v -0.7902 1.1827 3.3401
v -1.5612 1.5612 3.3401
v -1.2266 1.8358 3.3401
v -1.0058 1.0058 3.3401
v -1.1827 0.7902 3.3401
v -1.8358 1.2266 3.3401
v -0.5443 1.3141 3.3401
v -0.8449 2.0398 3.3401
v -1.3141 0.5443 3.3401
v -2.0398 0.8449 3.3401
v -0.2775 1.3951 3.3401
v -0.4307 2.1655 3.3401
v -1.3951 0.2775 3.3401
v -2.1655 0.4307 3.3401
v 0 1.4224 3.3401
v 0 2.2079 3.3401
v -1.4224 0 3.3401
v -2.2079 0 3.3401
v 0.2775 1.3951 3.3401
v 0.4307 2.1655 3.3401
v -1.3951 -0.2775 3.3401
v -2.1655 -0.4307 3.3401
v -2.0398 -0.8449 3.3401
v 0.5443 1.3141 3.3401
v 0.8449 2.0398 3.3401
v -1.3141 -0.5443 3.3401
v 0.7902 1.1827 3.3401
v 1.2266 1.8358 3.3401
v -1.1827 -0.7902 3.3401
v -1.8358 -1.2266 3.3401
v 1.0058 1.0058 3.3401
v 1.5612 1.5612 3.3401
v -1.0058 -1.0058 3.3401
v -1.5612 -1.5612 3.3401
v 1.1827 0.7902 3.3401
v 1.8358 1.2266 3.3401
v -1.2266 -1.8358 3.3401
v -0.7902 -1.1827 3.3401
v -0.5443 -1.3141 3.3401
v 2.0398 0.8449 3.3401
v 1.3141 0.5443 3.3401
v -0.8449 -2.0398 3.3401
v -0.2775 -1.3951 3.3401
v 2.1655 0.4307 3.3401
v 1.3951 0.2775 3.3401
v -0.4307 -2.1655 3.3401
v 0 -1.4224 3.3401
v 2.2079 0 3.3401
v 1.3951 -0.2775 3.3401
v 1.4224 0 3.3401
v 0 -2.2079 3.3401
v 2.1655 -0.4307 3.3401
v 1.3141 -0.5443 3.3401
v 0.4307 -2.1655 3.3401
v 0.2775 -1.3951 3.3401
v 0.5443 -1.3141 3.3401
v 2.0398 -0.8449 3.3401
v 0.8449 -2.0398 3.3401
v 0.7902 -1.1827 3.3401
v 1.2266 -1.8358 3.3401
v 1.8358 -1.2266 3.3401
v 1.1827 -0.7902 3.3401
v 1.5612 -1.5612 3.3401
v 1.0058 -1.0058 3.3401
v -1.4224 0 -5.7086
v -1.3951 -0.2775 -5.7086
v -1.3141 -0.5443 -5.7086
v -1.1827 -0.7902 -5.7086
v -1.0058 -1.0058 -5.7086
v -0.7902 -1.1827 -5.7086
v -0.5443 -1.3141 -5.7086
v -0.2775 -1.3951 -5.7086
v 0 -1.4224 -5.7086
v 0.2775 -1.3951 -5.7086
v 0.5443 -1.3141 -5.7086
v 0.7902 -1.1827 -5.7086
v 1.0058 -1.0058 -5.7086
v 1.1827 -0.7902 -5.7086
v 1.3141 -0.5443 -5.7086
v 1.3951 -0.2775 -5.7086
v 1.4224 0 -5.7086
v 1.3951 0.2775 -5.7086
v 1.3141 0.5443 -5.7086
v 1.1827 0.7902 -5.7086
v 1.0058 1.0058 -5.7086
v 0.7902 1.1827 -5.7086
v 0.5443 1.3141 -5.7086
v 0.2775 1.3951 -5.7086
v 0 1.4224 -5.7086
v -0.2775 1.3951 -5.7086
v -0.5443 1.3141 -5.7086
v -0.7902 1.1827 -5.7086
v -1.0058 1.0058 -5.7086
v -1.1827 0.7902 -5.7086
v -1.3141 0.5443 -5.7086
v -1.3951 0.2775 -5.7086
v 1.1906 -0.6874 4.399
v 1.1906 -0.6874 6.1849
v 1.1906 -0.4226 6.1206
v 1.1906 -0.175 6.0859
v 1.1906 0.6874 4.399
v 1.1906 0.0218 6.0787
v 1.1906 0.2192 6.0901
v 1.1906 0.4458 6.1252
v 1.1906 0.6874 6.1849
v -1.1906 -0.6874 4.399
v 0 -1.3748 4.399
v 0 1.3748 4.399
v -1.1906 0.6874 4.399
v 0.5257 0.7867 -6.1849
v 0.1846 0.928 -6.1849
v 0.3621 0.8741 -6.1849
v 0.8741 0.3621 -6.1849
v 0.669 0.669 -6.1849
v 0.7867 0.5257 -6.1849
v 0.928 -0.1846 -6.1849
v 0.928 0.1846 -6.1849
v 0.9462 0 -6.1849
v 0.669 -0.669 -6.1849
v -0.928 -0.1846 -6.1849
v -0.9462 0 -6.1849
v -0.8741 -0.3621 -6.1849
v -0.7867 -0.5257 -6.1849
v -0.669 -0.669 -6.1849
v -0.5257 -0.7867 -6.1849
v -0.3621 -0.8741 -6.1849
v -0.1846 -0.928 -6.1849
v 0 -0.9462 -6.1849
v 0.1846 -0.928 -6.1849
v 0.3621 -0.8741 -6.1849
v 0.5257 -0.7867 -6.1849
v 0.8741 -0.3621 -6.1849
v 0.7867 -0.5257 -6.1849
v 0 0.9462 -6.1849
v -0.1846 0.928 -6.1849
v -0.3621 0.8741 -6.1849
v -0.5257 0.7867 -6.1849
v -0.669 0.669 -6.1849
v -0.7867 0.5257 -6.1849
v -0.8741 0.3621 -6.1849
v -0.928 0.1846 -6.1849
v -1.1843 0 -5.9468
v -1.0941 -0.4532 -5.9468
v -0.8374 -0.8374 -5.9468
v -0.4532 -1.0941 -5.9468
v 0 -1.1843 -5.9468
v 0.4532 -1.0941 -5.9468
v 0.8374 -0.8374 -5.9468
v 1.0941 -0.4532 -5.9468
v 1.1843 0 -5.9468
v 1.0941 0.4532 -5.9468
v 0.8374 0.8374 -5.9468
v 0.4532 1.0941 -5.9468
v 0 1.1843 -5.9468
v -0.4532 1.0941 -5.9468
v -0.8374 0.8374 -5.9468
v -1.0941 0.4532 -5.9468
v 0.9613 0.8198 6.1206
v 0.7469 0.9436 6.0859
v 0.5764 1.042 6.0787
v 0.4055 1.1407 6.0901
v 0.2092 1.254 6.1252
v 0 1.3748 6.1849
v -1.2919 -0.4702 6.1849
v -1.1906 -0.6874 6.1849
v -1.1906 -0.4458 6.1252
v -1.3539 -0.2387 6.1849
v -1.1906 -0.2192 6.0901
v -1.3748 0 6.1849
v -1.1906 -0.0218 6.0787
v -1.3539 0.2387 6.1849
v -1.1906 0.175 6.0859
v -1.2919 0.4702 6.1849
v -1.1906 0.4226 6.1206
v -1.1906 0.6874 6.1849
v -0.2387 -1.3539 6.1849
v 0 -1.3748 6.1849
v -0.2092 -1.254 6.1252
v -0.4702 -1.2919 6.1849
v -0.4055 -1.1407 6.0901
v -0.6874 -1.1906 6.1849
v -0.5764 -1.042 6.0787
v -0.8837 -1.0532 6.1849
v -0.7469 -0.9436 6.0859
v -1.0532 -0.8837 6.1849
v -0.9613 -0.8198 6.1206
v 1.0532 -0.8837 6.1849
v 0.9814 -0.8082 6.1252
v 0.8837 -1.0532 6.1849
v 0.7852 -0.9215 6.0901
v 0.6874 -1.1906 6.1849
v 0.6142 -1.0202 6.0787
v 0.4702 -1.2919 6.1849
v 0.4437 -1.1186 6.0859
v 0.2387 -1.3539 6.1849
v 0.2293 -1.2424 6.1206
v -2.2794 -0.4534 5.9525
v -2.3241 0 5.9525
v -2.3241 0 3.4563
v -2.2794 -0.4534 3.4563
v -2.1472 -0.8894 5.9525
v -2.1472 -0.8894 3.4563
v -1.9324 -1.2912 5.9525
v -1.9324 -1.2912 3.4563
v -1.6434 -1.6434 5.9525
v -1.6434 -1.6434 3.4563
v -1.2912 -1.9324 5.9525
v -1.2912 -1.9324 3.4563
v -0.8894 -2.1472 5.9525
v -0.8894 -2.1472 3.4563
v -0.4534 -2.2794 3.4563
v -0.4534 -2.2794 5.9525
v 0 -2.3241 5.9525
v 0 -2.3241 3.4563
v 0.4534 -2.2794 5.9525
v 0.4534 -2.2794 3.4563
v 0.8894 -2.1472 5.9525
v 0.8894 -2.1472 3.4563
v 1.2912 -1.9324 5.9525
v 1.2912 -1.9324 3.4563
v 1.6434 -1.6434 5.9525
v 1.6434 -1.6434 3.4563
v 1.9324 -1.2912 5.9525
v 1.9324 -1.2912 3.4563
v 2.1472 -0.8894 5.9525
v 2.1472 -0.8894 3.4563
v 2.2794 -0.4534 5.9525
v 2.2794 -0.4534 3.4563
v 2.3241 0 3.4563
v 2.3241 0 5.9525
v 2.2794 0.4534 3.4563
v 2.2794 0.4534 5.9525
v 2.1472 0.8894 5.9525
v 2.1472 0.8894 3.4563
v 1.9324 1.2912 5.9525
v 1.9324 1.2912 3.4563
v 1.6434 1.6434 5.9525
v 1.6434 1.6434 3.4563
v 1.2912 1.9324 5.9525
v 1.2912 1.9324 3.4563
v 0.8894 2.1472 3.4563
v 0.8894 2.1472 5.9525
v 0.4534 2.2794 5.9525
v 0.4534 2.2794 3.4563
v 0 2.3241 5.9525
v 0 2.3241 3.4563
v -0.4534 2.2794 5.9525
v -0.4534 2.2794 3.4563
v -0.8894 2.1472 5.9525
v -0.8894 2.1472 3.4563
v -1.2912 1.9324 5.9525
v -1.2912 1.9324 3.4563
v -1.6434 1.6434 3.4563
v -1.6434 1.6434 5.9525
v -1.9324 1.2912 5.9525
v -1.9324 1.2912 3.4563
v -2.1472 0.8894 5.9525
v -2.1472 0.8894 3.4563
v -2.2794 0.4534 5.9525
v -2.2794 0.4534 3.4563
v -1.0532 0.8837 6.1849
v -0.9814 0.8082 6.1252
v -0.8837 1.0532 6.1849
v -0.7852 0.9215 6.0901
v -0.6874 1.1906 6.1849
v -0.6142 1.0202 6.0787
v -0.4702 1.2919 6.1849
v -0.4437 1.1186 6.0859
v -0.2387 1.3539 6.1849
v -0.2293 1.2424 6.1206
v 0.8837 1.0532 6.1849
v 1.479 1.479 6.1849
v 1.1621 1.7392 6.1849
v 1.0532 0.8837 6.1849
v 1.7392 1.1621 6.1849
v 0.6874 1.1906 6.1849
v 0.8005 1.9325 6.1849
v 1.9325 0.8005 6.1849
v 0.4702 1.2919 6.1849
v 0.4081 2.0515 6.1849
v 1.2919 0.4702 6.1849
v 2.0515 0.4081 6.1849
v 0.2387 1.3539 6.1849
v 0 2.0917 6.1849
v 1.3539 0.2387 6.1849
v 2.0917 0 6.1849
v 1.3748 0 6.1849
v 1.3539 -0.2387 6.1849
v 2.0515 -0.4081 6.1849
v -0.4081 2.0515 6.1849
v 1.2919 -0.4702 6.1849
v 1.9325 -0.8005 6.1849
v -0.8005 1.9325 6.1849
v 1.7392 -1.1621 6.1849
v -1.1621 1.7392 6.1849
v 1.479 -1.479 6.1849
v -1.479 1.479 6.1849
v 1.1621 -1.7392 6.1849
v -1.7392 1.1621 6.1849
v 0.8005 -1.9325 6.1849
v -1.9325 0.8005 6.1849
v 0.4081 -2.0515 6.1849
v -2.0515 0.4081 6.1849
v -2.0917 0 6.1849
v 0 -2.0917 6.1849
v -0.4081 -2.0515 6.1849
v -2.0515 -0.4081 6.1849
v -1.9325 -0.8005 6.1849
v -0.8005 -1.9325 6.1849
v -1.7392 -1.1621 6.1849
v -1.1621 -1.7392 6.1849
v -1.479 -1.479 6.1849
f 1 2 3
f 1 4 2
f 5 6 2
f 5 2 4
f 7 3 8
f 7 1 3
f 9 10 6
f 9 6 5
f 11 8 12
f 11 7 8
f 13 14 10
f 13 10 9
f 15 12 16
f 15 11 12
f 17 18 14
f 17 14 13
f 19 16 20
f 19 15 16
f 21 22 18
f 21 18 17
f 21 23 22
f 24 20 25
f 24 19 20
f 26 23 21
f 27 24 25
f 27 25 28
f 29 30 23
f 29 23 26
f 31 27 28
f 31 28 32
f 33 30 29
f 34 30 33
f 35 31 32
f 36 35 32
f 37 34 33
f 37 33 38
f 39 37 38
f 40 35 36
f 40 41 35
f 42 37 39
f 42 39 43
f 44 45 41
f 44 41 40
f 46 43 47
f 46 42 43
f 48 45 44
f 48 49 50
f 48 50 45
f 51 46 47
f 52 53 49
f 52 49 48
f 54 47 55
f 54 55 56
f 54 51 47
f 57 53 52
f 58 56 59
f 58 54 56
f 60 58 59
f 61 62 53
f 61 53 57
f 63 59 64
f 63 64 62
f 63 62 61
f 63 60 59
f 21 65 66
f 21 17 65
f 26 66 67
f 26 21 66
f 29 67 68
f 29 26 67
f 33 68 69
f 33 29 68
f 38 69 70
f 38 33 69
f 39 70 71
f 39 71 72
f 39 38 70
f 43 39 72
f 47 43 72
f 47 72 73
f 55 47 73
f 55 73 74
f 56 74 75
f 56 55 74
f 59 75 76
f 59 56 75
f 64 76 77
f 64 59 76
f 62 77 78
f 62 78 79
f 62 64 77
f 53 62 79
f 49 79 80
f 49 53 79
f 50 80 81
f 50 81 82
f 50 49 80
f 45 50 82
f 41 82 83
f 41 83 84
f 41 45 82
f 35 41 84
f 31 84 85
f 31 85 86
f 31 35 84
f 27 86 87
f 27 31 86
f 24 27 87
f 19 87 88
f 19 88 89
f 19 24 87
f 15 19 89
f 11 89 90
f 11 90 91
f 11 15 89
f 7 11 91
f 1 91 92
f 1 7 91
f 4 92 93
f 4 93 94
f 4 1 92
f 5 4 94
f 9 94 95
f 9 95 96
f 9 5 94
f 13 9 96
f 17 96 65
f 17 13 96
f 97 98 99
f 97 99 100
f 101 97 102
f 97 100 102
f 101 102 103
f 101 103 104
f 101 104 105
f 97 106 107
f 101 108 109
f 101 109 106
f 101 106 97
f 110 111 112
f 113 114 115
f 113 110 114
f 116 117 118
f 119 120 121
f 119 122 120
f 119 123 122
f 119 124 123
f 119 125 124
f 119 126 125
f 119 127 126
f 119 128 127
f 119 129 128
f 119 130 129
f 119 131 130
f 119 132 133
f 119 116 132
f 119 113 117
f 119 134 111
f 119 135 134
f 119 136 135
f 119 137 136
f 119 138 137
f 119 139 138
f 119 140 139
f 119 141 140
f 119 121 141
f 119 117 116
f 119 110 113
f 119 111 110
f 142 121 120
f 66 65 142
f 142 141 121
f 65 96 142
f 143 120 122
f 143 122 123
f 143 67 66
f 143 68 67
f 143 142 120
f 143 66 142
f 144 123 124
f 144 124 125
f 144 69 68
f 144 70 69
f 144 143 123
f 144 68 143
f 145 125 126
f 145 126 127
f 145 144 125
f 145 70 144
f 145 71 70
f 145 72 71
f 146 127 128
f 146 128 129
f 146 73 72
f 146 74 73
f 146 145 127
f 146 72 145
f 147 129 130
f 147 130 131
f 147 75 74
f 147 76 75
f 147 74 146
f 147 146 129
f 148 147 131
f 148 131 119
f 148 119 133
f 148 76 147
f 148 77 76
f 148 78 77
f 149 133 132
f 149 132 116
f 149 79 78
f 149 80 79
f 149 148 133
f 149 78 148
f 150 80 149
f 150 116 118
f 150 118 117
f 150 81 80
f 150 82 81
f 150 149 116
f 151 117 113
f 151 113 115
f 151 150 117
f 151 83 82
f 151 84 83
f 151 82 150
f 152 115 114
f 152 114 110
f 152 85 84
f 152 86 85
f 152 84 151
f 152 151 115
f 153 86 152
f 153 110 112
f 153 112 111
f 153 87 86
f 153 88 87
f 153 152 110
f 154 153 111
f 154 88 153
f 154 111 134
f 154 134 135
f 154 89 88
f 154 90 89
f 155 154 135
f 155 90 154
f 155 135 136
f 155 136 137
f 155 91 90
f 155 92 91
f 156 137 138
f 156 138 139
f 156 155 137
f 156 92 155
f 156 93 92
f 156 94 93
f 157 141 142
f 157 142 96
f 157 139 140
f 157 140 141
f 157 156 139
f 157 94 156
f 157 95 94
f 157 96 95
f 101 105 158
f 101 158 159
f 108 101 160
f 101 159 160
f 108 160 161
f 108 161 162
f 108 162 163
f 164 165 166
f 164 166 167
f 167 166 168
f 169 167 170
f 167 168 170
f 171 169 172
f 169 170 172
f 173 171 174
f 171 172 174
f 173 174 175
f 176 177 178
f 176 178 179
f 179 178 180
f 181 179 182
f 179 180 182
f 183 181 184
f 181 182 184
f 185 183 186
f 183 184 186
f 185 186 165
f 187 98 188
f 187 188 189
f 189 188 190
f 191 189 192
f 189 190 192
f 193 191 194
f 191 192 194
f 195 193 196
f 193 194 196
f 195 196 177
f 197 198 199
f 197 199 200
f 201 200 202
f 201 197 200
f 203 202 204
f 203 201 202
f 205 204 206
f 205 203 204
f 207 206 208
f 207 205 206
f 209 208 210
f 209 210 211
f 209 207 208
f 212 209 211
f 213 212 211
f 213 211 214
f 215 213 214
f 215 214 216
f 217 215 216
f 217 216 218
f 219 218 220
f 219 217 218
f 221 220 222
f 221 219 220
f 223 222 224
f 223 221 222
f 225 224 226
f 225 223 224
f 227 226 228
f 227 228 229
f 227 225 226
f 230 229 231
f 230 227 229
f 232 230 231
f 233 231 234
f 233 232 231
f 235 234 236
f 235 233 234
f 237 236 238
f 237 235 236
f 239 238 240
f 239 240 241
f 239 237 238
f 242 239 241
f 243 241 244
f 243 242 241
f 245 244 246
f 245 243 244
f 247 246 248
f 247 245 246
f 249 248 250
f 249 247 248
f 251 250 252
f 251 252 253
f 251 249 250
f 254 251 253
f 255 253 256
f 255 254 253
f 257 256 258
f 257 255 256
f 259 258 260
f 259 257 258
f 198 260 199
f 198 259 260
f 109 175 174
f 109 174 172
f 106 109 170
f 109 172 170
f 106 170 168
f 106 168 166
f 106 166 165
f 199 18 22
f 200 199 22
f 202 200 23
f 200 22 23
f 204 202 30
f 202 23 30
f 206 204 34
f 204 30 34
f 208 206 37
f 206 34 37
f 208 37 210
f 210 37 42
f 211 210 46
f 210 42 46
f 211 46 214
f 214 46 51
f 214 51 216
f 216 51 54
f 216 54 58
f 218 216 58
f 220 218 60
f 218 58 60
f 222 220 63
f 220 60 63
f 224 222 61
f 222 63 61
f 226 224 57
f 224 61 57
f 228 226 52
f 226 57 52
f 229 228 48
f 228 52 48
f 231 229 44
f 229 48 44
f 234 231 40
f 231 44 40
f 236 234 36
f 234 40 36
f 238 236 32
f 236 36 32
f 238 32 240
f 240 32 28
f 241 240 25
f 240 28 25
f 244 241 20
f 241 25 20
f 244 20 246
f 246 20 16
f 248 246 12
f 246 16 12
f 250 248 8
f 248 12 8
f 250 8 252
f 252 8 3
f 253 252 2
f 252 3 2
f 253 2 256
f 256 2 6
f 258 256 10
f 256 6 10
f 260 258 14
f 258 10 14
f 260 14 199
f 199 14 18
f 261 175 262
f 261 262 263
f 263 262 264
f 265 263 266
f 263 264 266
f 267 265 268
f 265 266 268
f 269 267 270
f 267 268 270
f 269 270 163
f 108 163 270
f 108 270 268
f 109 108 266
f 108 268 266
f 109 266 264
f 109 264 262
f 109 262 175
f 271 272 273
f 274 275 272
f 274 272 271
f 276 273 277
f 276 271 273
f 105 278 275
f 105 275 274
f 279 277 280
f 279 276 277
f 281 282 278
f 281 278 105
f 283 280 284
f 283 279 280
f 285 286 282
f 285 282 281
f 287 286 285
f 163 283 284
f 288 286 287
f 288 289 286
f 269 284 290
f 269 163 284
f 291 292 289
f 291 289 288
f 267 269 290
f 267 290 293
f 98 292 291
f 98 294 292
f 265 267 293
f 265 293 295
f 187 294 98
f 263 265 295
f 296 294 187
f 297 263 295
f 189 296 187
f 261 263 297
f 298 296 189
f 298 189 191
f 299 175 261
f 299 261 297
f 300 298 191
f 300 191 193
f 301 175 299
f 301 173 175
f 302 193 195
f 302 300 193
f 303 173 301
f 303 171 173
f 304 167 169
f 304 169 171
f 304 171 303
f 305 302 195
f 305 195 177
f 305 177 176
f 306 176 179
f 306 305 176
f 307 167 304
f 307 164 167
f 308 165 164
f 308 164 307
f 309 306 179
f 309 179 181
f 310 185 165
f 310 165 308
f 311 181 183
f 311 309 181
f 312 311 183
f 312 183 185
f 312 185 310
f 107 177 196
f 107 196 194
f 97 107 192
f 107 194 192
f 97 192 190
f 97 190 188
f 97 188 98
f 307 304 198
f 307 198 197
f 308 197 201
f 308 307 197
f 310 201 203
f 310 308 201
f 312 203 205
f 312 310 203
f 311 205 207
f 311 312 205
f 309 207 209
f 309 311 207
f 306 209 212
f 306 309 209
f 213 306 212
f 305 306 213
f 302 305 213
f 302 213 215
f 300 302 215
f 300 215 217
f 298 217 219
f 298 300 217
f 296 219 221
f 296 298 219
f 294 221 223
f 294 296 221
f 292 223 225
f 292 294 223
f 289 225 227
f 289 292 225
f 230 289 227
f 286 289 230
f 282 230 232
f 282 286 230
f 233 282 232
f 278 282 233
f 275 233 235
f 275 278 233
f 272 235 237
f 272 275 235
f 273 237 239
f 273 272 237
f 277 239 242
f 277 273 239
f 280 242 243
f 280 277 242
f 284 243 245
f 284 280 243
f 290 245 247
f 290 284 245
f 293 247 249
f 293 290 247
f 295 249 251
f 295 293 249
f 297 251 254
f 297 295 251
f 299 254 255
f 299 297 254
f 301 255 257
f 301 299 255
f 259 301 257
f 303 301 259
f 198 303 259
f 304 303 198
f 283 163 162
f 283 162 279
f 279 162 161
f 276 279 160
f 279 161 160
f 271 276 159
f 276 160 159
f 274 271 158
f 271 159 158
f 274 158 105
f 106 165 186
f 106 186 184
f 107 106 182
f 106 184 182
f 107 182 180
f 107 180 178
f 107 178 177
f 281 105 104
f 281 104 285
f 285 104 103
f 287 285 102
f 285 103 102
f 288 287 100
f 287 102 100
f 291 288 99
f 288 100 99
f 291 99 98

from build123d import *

# Parameters (mm, degrees)
CUT_EXTRUDE1_DEPTH = 1.7859375
CHAMFER1_SIZE      = 0.23241
CHAMFER2_SIZE      = 0.116205


with BuildPart() as part:
    # Sketch2 → Revolve1 (revolve)
    with BuildSketch(Plane(origin=(0, 0, 0), x_dir=(0, 0, -1), z_dir=(1, 0, 0))):
        Polygon((6.1849, 0.94615), (5.70865, 1.4224), (-3.3401, 1.4224), (-3.3401, 2.3241), (-6.1849, 2.3241), (-6.1849, 0), (6.1849, 0), align=None)
    revolve(axis=Axis((0, 0, -6.1849), (0, 0, 1)))

    # Sketch4 → Cut-Extrude1 (cut)
    with BuildSketch(Plane.XY.offset(6.1849)):
        Polygon((0, 1.374815329), (-1.190625, 0.687407664), (-1.190625, -0.687407664), (0, -1.374815329), (1.190625, -0.687407664), (1.190625, 0.687407664), align=None)
    extrude(amount=-CUT_EXTRUDE1_DEPTH, mode=Mode.SUBTRACT)

    # Cut-Extrude2 cone 1 section (through the dimple's axis) → Cut-Extrude2 (revolve, cut)
    with BuildSketch(Plane(origin=(0, 0, 6.1849), x_dir=(0, -1, 0), z_dir=(1, 0, 0))):
        Polygon((0, 0), (1.374815329, 0), (0, 0.79375), align=None)
    revolve(axis=Axis((0, 0, 6.1849), (0, 0, -1)), mode=Mode.SUBTRACT)

    # Chamfer1
    chamfer1_edges = [part.edges().sort_by_distance(p)[0] for p in [
        (0, -2.3241, 6.1849),
    ]]
    chamfer(chamfer1_edges, length=CHAMFER1_SIZE)

    # Chamfer2
    chamfer2_edges = [part.edges().sort_by_distance(p)[0] for p in [
        (0, -2.3241, 3.3401),
    ]]
    chamfer(chamfer2_edges, length=CHAMFER2_SIZE)


solid = part.part
